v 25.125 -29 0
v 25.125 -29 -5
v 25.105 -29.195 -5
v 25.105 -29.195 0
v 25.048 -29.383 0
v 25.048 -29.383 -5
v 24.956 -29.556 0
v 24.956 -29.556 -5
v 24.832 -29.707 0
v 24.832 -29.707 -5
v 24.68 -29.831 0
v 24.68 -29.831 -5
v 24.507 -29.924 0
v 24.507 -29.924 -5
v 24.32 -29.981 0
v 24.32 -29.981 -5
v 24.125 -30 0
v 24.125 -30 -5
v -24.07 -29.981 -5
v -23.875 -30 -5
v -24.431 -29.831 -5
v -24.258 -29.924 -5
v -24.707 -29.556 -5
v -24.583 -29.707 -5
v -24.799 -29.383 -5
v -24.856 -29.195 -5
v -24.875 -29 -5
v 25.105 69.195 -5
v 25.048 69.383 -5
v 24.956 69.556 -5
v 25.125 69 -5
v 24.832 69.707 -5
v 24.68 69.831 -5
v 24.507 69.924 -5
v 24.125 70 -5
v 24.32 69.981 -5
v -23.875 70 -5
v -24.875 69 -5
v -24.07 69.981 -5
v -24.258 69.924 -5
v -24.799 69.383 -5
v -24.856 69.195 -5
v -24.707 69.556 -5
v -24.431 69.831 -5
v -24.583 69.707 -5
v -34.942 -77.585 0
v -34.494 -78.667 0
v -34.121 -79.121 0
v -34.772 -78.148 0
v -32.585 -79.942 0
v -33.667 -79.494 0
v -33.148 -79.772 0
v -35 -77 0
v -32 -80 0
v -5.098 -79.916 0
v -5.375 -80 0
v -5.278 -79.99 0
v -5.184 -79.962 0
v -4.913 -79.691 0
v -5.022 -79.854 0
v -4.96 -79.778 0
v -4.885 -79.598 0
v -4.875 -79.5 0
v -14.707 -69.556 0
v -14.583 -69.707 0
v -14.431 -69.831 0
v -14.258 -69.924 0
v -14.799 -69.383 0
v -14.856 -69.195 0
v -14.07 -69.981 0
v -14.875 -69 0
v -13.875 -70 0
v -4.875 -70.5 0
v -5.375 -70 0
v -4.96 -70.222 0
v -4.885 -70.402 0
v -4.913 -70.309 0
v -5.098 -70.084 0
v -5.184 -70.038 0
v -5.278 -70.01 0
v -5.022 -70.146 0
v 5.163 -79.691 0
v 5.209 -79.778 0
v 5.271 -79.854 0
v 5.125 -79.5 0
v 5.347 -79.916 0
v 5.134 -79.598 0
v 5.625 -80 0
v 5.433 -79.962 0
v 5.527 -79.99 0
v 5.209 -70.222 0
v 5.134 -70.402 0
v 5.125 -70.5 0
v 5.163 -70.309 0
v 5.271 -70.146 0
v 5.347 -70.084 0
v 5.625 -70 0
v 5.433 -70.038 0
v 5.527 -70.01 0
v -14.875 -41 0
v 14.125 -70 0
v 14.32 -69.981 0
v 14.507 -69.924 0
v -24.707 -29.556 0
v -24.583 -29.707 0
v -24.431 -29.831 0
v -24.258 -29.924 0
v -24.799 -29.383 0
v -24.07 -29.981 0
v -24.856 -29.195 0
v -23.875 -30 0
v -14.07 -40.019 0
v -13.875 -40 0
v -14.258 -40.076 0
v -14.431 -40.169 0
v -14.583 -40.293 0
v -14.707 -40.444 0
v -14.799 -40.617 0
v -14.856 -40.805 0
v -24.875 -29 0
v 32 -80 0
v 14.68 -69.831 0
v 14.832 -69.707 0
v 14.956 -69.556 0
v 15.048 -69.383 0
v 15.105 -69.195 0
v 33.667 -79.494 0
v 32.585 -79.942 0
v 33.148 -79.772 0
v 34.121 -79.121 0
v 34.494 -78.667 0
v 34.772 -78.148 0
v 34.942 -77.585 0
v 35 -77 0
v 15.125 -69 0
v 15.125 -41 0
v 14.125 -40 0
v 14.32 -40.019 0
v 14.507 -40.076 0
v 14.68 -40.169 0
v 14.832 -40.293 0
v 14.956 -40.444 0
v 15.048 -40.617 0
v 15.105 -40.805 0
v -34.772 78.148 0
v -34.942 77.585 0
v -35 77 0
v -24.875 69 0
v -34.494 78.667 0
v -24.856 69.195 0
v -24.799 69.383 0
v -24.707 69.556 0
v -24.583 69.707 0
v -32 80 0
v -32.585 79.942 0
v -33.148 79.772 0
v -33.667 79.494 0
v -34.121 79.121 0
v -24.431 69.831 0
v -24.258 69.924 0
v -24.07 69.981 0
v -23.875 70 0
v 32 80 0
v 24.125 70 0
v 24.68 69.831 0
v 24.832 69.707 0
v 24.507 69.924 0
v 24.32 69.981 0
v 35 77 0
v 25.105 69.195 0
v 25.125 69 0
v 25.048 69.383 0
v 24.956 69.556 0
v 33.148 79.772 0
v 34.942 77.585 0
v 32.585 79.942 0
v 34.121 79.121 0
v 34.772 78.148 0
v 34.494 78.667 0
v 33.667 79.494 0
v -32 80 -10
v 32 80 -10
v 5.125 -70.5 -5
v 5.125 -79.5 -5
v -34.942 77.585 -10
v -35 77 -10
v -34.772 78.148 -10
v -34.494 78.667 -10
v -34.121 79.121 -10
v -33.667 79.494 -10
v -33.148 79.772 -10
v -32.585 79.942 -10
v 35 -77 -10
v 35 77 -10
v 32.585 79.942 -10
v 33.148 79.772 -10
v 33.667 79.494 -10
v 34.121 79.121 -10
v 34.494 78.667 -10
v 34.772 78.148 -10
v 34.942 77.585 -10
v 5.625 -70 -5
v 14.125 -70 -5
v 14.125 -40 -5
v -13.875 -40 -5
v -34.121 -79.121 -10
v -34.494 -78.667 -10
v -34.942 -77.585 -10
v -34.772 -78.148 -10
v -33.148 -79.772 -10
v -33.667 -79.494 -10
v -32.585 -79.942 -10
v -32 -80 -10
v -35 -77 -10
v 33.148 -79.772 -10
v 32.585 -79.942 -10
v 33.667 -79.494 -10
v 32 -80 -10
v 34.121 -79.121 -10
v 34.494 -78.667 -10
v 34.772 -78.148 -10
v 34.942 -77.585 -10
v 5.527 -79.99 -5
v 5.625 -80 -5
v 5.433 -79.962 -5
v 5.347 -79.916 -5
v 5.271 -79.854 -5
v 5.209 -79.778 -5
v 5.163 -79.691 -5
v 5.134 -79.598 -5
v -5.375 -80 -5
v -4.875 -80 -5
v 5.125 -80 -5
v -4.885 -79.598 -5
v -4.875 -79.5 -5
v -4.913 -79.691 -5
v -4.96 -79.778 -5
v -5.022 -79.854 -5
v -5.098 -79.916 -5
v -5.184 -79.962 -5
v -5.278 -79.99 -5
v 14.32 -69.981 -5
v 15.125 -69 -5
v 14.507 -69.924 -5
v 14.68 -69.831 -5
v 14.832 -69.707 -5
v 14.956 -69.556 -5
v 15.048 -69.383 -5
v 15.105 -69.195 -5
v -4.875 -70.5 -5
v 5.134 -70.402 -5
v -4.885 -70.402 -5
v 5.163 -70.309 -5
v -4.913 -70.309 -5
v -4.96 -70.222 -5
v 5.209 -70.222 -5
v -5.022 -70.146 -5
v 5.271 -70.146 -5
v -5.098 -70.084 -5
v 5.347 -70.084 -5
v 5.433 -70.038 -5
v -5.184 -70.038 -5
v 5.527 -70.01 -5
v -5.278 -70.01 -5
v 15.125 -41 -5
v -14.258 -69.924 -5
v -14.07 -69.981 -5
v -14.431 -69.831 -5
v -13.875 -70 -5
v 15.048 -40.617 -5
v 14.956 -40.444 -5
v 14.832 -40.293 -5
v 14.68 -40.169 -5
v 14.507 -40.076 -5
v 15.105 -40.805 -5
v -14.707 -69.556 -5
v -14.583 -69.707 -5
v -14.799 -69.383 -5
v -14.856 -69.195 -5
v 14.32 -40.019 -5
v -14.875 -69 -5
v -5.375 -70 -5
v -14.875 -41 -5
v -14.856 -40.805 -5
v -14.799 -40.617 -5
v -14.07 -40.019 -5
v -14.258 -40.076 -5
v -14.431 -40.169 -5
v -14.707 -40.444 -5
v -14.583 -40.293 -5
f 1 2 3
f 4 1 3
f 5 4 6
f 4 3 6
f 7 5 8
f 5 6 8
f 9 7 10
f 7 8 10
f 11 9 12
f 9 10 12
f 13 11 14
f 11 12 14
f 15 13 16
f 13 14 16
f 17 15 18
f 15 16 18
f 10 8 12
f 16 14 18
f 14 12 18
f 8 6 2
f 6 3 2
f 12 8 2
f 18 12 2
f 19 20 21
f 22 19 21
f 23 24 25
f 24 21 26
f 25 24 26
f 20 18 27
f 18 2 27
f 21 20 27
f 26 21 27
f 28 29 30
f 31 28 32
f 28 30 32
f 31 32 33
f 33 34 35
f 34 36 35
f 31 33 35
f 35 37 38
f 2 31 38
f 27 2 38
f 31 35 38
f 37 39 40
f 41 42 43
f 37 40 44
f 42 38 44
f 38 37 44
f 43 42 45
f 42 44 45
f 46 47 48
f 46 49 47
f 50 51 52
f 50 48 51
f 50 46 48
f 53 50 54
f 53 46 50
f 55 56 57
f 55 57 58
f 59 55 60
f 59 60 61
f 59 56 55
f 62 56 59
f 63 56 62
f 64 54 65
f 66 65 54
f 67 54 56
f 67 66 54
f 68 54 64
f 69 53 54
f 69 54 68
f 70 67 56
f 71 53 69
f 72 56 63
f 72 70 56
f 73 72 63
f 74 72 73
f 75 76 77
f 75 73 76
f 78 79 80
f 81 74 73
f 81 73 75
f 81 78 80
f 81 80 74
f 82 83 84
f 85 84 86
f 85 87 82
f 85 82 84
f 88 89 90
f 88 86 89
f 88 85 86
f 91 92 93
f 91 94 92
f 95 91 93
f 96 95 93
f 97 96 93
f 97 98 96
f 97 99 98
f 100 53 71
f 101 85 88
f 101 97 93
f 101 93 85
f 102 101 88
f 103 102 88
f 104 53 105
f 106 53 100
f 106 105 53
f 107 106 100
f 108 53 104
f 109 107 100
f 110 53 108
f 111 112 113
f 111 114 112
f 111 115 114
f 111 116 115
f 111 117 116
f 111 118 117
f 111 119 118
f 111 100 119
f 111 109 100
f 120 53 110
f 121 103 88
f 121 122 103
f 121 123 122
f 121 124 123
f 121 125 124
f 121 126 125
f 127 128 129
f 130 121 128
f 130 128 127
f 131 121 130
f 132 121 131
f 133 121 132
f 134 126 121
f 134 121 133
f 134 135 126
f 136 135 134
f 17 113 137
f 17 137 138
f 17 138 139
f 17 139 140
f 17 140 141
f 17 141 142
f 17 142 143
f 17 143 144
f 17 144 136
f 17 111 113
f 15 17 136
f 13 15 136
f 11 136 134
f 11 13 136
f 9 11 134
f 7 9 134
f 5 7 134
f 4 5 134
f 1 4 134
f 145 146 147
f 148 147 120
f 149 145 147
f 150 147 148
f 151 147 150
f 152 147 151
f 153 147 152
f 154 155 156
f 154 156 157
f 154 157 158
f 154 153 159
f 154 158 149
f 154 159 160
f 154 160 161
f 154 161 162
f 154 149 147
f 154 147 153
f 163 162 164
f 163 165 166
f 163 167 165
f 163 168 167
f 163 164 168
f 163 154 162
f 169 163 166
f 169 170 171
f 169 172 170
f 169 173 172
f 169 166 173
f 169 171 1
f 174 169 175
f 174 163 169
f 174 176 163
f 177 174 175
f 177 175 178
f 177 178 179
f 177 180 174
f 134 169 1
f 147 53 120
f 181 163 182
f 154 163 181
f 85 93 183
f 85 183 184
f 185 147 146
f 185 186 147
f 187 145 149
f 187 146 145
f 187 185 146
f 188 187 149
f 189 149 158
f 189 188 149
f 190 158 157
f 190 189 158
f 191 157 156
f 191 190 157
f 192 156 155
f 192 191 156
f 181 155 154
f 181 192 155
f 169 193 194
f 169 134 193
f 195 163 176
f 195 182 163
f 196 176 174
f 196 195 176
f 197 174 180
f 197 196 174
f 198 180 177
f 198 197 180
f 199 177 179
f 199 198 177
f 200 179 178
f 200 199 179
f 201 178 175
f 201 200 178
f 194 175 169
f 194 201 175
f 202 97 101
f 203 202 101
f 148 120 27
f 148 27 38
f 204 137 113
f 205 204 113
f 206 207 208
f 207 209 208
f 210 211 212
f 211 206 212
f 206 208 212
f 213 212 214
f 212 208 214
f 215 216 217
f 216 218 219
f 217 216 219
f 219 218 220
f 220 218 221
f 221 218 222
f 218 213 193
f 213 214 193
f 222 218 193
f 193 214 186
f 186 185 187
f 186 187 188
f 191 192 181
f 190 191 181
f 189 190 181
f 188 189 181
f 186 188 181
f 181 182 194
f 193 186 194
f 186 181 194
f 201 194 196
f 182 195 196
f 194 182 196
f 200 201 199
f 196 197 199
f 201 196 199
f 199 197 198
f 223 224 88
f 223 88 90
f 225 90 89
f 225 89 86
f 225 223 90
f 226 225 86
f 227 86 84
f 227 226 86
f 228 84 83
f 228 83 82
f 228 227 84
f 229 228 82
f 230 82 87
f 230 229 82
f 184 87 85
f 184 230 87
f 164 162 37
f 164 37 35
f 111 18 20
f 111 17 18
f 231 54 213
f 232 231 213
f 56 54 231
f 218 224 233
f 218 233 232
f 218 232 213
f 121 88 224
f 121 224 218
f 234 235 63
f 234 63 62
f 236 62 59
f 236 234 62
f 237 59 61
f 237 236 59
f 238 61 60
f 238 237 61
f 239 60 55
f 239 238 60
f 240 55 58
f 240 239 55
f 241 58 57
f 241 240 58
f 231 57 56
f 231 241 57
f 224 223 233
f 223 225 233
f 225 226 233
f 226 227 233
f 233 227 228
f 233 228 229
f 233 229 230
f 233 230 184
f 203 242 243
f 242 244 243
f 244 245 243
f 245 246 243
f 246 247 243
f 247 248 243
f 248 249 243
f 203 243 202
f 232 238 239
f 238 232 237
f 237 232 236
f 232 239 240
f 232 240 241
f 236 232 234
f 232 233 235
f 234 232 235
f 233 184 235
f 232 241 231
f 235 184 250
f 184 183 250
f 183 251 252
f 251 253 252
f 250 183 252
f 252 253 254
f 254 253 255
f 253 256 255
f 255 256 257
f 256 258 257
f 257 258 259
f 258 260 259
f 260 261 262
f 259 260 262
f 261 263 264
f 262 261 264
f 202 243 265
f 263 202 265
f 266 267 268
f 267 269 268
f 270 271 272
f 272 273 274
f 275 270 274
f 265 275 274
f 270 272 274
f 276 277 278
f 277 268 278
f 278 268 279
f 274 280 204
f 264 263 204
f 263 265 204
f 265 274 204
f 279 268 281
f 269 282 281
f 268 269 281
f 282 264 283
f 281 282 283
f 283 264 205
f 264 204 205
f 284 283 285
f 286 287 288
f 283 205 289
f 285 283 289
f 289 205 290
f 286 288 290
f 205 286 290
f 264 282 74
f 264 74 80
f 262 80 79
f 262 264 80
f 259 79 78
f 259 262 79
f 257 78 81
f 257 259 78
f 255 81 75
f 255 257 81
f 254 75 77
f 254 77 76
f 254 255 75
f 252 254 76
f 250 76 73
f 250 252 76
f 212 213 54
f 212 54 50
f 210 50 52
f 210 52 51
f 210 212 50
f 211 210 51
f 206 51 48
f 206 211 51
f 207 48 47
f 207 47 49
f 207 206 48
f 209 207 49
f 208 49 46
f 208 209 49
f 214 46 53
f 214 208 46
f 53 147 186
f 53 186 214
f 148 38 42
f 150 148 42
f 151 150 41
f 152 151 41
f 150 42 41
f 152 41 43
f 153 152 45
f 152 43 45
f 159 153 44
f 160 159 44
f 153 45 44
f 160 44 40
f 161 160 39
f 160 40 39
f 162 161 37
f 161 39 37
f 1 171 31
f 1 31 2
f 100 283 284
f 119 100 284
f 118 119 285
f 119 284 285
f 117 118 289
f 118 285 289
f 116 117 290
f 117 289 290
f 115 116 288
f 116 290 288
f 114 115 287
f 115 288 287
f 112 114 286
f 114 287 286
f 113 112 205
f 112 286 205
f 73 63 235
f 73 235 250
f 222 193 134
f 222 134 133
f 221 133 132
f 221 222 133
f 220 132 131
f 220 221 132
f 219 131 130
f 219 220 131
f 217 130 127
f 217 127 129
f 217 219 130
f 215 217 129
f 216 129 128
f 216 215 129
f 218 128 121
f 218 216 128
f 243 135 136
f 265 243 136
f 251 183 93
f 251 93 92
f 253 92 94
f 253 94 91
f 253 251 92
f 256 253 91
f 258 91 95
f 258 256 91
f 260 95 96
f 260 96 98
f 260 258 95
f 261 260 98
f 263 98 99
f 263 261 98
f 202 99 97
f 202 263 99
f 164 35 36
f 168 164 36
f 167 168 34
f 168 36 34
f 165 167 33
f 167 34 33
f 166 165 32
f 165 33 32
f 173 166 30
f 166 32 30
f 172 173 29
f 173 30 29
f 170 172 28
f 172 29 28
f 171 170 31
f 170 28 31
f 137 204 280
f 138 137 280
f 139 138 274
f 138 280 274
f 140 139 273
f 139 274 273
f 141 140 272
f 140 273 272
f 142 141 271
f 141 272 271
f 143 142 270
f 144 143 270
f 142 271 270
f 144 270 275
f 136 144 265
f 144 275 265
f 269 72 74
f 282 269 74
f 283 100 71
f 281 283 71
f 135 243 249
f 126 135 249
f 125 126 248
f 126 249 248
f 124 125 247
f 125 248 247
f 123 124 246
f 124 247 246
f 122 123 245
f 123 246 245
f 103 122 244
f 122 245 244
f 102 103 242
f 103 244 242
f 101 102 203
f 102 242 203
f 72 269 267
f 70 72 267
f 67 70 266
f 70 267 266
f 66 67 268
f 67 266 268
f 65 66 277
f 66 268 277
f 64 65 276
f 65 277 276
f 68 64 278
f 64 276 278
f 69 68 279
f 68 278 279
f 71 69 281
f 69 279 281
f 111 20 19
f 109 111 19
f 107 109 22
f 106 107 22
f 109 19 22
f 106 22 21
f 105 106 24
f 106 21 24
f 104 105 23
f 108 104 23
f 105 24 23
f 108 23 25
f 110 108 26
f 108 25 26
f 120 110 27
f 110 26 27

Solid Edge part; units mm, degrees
sketch "Sketch1" plane through (0, 0, 0) normal (0, 0, 1) x (1, 0, 0)
  line L0 (35, -80) -> (35, 80)
  line L1 (35, 80) -> (-35, 80)
  line L2 (-35, 80) -> (-35, -80)
  line L3 (-35, -80) -> (35, -80)
extrude "Protrusion1" add sketch "Sketch1" against normal blind 10
sketch "Sketch2" plane through (0, 0, 0) normal (0, 0, 1) x (1, 0, 0)
  line L0 (-24.8754, 70) -> (25.1246, 70)
  line L1 (25.1246, 70) -> (25.1246, -30)
  line L2 (25.1246, -30) -> (-24.8754, -30)
  line L3 (-24.8754, -30) -> (-24.8754, 70)
extrude "Recorte_Extrudado_1" cut sketch "Sketch2" against normal blind 5
sketch "Sketch3" plane through (0, 0, 0) normal (0, 0, 1) x (0, -1, 0)
  line L0 (40, 15.1246) -> (40, -14.8754)
  line L1 (40, -14.8754) -> (70, -14.8754)
  line L2 (70, -14.8754) -> (70, 15.1246)
  line L3 (70, 15.1246) -> (40, 15.1246)
extrude "Recorte_Extrudado_2" cut sketch "Sketch3" against normal blind 5
fillet "Redondo_1" radius 1 1 edges at (25.1246, -30, -2.5)
fillet "Redondo_2" radius 1 7 edges at (-24.8754, -30, -2.5) (25.1246, 70, -2.5) (-24.8754, 70, -2.5) (15.1246, -40, -2.5) (-14.8754, -40, -2.5) (15.1246, -70, -2.5) (-14.8754, -70, -2.5)
fillet "Redondo_3" radius 3 4 edges at (-35, -80, -5) (35, -80, -5) (35, 80, -5) (-35, 80, -5)
sketch "Sketch4" plane through (0, 0, 0) normal (0, 0, 1) x (1, 0, 0)
  line L0 (-4.8754, -80) -> (-4.8754, -70)
  line L1 (-4.8754, -70) -> (5.1246, -70)
  line L2 (5.1246, -70) -> (5.1246, -80)
  line L3 (5.1246, -80) -> (-4.8754, -80)
extrude "Recorte_Extrudado_3" cut sketch "Sketch4" against normal blind 5
fillet "Redondo_4" radius 0.5 4 edges at (5.1246, -70, -2.5) (-4.8754, -70, -2.5) (-4.8754, -80, -2.5) (5.1246, -80, -2.5)
